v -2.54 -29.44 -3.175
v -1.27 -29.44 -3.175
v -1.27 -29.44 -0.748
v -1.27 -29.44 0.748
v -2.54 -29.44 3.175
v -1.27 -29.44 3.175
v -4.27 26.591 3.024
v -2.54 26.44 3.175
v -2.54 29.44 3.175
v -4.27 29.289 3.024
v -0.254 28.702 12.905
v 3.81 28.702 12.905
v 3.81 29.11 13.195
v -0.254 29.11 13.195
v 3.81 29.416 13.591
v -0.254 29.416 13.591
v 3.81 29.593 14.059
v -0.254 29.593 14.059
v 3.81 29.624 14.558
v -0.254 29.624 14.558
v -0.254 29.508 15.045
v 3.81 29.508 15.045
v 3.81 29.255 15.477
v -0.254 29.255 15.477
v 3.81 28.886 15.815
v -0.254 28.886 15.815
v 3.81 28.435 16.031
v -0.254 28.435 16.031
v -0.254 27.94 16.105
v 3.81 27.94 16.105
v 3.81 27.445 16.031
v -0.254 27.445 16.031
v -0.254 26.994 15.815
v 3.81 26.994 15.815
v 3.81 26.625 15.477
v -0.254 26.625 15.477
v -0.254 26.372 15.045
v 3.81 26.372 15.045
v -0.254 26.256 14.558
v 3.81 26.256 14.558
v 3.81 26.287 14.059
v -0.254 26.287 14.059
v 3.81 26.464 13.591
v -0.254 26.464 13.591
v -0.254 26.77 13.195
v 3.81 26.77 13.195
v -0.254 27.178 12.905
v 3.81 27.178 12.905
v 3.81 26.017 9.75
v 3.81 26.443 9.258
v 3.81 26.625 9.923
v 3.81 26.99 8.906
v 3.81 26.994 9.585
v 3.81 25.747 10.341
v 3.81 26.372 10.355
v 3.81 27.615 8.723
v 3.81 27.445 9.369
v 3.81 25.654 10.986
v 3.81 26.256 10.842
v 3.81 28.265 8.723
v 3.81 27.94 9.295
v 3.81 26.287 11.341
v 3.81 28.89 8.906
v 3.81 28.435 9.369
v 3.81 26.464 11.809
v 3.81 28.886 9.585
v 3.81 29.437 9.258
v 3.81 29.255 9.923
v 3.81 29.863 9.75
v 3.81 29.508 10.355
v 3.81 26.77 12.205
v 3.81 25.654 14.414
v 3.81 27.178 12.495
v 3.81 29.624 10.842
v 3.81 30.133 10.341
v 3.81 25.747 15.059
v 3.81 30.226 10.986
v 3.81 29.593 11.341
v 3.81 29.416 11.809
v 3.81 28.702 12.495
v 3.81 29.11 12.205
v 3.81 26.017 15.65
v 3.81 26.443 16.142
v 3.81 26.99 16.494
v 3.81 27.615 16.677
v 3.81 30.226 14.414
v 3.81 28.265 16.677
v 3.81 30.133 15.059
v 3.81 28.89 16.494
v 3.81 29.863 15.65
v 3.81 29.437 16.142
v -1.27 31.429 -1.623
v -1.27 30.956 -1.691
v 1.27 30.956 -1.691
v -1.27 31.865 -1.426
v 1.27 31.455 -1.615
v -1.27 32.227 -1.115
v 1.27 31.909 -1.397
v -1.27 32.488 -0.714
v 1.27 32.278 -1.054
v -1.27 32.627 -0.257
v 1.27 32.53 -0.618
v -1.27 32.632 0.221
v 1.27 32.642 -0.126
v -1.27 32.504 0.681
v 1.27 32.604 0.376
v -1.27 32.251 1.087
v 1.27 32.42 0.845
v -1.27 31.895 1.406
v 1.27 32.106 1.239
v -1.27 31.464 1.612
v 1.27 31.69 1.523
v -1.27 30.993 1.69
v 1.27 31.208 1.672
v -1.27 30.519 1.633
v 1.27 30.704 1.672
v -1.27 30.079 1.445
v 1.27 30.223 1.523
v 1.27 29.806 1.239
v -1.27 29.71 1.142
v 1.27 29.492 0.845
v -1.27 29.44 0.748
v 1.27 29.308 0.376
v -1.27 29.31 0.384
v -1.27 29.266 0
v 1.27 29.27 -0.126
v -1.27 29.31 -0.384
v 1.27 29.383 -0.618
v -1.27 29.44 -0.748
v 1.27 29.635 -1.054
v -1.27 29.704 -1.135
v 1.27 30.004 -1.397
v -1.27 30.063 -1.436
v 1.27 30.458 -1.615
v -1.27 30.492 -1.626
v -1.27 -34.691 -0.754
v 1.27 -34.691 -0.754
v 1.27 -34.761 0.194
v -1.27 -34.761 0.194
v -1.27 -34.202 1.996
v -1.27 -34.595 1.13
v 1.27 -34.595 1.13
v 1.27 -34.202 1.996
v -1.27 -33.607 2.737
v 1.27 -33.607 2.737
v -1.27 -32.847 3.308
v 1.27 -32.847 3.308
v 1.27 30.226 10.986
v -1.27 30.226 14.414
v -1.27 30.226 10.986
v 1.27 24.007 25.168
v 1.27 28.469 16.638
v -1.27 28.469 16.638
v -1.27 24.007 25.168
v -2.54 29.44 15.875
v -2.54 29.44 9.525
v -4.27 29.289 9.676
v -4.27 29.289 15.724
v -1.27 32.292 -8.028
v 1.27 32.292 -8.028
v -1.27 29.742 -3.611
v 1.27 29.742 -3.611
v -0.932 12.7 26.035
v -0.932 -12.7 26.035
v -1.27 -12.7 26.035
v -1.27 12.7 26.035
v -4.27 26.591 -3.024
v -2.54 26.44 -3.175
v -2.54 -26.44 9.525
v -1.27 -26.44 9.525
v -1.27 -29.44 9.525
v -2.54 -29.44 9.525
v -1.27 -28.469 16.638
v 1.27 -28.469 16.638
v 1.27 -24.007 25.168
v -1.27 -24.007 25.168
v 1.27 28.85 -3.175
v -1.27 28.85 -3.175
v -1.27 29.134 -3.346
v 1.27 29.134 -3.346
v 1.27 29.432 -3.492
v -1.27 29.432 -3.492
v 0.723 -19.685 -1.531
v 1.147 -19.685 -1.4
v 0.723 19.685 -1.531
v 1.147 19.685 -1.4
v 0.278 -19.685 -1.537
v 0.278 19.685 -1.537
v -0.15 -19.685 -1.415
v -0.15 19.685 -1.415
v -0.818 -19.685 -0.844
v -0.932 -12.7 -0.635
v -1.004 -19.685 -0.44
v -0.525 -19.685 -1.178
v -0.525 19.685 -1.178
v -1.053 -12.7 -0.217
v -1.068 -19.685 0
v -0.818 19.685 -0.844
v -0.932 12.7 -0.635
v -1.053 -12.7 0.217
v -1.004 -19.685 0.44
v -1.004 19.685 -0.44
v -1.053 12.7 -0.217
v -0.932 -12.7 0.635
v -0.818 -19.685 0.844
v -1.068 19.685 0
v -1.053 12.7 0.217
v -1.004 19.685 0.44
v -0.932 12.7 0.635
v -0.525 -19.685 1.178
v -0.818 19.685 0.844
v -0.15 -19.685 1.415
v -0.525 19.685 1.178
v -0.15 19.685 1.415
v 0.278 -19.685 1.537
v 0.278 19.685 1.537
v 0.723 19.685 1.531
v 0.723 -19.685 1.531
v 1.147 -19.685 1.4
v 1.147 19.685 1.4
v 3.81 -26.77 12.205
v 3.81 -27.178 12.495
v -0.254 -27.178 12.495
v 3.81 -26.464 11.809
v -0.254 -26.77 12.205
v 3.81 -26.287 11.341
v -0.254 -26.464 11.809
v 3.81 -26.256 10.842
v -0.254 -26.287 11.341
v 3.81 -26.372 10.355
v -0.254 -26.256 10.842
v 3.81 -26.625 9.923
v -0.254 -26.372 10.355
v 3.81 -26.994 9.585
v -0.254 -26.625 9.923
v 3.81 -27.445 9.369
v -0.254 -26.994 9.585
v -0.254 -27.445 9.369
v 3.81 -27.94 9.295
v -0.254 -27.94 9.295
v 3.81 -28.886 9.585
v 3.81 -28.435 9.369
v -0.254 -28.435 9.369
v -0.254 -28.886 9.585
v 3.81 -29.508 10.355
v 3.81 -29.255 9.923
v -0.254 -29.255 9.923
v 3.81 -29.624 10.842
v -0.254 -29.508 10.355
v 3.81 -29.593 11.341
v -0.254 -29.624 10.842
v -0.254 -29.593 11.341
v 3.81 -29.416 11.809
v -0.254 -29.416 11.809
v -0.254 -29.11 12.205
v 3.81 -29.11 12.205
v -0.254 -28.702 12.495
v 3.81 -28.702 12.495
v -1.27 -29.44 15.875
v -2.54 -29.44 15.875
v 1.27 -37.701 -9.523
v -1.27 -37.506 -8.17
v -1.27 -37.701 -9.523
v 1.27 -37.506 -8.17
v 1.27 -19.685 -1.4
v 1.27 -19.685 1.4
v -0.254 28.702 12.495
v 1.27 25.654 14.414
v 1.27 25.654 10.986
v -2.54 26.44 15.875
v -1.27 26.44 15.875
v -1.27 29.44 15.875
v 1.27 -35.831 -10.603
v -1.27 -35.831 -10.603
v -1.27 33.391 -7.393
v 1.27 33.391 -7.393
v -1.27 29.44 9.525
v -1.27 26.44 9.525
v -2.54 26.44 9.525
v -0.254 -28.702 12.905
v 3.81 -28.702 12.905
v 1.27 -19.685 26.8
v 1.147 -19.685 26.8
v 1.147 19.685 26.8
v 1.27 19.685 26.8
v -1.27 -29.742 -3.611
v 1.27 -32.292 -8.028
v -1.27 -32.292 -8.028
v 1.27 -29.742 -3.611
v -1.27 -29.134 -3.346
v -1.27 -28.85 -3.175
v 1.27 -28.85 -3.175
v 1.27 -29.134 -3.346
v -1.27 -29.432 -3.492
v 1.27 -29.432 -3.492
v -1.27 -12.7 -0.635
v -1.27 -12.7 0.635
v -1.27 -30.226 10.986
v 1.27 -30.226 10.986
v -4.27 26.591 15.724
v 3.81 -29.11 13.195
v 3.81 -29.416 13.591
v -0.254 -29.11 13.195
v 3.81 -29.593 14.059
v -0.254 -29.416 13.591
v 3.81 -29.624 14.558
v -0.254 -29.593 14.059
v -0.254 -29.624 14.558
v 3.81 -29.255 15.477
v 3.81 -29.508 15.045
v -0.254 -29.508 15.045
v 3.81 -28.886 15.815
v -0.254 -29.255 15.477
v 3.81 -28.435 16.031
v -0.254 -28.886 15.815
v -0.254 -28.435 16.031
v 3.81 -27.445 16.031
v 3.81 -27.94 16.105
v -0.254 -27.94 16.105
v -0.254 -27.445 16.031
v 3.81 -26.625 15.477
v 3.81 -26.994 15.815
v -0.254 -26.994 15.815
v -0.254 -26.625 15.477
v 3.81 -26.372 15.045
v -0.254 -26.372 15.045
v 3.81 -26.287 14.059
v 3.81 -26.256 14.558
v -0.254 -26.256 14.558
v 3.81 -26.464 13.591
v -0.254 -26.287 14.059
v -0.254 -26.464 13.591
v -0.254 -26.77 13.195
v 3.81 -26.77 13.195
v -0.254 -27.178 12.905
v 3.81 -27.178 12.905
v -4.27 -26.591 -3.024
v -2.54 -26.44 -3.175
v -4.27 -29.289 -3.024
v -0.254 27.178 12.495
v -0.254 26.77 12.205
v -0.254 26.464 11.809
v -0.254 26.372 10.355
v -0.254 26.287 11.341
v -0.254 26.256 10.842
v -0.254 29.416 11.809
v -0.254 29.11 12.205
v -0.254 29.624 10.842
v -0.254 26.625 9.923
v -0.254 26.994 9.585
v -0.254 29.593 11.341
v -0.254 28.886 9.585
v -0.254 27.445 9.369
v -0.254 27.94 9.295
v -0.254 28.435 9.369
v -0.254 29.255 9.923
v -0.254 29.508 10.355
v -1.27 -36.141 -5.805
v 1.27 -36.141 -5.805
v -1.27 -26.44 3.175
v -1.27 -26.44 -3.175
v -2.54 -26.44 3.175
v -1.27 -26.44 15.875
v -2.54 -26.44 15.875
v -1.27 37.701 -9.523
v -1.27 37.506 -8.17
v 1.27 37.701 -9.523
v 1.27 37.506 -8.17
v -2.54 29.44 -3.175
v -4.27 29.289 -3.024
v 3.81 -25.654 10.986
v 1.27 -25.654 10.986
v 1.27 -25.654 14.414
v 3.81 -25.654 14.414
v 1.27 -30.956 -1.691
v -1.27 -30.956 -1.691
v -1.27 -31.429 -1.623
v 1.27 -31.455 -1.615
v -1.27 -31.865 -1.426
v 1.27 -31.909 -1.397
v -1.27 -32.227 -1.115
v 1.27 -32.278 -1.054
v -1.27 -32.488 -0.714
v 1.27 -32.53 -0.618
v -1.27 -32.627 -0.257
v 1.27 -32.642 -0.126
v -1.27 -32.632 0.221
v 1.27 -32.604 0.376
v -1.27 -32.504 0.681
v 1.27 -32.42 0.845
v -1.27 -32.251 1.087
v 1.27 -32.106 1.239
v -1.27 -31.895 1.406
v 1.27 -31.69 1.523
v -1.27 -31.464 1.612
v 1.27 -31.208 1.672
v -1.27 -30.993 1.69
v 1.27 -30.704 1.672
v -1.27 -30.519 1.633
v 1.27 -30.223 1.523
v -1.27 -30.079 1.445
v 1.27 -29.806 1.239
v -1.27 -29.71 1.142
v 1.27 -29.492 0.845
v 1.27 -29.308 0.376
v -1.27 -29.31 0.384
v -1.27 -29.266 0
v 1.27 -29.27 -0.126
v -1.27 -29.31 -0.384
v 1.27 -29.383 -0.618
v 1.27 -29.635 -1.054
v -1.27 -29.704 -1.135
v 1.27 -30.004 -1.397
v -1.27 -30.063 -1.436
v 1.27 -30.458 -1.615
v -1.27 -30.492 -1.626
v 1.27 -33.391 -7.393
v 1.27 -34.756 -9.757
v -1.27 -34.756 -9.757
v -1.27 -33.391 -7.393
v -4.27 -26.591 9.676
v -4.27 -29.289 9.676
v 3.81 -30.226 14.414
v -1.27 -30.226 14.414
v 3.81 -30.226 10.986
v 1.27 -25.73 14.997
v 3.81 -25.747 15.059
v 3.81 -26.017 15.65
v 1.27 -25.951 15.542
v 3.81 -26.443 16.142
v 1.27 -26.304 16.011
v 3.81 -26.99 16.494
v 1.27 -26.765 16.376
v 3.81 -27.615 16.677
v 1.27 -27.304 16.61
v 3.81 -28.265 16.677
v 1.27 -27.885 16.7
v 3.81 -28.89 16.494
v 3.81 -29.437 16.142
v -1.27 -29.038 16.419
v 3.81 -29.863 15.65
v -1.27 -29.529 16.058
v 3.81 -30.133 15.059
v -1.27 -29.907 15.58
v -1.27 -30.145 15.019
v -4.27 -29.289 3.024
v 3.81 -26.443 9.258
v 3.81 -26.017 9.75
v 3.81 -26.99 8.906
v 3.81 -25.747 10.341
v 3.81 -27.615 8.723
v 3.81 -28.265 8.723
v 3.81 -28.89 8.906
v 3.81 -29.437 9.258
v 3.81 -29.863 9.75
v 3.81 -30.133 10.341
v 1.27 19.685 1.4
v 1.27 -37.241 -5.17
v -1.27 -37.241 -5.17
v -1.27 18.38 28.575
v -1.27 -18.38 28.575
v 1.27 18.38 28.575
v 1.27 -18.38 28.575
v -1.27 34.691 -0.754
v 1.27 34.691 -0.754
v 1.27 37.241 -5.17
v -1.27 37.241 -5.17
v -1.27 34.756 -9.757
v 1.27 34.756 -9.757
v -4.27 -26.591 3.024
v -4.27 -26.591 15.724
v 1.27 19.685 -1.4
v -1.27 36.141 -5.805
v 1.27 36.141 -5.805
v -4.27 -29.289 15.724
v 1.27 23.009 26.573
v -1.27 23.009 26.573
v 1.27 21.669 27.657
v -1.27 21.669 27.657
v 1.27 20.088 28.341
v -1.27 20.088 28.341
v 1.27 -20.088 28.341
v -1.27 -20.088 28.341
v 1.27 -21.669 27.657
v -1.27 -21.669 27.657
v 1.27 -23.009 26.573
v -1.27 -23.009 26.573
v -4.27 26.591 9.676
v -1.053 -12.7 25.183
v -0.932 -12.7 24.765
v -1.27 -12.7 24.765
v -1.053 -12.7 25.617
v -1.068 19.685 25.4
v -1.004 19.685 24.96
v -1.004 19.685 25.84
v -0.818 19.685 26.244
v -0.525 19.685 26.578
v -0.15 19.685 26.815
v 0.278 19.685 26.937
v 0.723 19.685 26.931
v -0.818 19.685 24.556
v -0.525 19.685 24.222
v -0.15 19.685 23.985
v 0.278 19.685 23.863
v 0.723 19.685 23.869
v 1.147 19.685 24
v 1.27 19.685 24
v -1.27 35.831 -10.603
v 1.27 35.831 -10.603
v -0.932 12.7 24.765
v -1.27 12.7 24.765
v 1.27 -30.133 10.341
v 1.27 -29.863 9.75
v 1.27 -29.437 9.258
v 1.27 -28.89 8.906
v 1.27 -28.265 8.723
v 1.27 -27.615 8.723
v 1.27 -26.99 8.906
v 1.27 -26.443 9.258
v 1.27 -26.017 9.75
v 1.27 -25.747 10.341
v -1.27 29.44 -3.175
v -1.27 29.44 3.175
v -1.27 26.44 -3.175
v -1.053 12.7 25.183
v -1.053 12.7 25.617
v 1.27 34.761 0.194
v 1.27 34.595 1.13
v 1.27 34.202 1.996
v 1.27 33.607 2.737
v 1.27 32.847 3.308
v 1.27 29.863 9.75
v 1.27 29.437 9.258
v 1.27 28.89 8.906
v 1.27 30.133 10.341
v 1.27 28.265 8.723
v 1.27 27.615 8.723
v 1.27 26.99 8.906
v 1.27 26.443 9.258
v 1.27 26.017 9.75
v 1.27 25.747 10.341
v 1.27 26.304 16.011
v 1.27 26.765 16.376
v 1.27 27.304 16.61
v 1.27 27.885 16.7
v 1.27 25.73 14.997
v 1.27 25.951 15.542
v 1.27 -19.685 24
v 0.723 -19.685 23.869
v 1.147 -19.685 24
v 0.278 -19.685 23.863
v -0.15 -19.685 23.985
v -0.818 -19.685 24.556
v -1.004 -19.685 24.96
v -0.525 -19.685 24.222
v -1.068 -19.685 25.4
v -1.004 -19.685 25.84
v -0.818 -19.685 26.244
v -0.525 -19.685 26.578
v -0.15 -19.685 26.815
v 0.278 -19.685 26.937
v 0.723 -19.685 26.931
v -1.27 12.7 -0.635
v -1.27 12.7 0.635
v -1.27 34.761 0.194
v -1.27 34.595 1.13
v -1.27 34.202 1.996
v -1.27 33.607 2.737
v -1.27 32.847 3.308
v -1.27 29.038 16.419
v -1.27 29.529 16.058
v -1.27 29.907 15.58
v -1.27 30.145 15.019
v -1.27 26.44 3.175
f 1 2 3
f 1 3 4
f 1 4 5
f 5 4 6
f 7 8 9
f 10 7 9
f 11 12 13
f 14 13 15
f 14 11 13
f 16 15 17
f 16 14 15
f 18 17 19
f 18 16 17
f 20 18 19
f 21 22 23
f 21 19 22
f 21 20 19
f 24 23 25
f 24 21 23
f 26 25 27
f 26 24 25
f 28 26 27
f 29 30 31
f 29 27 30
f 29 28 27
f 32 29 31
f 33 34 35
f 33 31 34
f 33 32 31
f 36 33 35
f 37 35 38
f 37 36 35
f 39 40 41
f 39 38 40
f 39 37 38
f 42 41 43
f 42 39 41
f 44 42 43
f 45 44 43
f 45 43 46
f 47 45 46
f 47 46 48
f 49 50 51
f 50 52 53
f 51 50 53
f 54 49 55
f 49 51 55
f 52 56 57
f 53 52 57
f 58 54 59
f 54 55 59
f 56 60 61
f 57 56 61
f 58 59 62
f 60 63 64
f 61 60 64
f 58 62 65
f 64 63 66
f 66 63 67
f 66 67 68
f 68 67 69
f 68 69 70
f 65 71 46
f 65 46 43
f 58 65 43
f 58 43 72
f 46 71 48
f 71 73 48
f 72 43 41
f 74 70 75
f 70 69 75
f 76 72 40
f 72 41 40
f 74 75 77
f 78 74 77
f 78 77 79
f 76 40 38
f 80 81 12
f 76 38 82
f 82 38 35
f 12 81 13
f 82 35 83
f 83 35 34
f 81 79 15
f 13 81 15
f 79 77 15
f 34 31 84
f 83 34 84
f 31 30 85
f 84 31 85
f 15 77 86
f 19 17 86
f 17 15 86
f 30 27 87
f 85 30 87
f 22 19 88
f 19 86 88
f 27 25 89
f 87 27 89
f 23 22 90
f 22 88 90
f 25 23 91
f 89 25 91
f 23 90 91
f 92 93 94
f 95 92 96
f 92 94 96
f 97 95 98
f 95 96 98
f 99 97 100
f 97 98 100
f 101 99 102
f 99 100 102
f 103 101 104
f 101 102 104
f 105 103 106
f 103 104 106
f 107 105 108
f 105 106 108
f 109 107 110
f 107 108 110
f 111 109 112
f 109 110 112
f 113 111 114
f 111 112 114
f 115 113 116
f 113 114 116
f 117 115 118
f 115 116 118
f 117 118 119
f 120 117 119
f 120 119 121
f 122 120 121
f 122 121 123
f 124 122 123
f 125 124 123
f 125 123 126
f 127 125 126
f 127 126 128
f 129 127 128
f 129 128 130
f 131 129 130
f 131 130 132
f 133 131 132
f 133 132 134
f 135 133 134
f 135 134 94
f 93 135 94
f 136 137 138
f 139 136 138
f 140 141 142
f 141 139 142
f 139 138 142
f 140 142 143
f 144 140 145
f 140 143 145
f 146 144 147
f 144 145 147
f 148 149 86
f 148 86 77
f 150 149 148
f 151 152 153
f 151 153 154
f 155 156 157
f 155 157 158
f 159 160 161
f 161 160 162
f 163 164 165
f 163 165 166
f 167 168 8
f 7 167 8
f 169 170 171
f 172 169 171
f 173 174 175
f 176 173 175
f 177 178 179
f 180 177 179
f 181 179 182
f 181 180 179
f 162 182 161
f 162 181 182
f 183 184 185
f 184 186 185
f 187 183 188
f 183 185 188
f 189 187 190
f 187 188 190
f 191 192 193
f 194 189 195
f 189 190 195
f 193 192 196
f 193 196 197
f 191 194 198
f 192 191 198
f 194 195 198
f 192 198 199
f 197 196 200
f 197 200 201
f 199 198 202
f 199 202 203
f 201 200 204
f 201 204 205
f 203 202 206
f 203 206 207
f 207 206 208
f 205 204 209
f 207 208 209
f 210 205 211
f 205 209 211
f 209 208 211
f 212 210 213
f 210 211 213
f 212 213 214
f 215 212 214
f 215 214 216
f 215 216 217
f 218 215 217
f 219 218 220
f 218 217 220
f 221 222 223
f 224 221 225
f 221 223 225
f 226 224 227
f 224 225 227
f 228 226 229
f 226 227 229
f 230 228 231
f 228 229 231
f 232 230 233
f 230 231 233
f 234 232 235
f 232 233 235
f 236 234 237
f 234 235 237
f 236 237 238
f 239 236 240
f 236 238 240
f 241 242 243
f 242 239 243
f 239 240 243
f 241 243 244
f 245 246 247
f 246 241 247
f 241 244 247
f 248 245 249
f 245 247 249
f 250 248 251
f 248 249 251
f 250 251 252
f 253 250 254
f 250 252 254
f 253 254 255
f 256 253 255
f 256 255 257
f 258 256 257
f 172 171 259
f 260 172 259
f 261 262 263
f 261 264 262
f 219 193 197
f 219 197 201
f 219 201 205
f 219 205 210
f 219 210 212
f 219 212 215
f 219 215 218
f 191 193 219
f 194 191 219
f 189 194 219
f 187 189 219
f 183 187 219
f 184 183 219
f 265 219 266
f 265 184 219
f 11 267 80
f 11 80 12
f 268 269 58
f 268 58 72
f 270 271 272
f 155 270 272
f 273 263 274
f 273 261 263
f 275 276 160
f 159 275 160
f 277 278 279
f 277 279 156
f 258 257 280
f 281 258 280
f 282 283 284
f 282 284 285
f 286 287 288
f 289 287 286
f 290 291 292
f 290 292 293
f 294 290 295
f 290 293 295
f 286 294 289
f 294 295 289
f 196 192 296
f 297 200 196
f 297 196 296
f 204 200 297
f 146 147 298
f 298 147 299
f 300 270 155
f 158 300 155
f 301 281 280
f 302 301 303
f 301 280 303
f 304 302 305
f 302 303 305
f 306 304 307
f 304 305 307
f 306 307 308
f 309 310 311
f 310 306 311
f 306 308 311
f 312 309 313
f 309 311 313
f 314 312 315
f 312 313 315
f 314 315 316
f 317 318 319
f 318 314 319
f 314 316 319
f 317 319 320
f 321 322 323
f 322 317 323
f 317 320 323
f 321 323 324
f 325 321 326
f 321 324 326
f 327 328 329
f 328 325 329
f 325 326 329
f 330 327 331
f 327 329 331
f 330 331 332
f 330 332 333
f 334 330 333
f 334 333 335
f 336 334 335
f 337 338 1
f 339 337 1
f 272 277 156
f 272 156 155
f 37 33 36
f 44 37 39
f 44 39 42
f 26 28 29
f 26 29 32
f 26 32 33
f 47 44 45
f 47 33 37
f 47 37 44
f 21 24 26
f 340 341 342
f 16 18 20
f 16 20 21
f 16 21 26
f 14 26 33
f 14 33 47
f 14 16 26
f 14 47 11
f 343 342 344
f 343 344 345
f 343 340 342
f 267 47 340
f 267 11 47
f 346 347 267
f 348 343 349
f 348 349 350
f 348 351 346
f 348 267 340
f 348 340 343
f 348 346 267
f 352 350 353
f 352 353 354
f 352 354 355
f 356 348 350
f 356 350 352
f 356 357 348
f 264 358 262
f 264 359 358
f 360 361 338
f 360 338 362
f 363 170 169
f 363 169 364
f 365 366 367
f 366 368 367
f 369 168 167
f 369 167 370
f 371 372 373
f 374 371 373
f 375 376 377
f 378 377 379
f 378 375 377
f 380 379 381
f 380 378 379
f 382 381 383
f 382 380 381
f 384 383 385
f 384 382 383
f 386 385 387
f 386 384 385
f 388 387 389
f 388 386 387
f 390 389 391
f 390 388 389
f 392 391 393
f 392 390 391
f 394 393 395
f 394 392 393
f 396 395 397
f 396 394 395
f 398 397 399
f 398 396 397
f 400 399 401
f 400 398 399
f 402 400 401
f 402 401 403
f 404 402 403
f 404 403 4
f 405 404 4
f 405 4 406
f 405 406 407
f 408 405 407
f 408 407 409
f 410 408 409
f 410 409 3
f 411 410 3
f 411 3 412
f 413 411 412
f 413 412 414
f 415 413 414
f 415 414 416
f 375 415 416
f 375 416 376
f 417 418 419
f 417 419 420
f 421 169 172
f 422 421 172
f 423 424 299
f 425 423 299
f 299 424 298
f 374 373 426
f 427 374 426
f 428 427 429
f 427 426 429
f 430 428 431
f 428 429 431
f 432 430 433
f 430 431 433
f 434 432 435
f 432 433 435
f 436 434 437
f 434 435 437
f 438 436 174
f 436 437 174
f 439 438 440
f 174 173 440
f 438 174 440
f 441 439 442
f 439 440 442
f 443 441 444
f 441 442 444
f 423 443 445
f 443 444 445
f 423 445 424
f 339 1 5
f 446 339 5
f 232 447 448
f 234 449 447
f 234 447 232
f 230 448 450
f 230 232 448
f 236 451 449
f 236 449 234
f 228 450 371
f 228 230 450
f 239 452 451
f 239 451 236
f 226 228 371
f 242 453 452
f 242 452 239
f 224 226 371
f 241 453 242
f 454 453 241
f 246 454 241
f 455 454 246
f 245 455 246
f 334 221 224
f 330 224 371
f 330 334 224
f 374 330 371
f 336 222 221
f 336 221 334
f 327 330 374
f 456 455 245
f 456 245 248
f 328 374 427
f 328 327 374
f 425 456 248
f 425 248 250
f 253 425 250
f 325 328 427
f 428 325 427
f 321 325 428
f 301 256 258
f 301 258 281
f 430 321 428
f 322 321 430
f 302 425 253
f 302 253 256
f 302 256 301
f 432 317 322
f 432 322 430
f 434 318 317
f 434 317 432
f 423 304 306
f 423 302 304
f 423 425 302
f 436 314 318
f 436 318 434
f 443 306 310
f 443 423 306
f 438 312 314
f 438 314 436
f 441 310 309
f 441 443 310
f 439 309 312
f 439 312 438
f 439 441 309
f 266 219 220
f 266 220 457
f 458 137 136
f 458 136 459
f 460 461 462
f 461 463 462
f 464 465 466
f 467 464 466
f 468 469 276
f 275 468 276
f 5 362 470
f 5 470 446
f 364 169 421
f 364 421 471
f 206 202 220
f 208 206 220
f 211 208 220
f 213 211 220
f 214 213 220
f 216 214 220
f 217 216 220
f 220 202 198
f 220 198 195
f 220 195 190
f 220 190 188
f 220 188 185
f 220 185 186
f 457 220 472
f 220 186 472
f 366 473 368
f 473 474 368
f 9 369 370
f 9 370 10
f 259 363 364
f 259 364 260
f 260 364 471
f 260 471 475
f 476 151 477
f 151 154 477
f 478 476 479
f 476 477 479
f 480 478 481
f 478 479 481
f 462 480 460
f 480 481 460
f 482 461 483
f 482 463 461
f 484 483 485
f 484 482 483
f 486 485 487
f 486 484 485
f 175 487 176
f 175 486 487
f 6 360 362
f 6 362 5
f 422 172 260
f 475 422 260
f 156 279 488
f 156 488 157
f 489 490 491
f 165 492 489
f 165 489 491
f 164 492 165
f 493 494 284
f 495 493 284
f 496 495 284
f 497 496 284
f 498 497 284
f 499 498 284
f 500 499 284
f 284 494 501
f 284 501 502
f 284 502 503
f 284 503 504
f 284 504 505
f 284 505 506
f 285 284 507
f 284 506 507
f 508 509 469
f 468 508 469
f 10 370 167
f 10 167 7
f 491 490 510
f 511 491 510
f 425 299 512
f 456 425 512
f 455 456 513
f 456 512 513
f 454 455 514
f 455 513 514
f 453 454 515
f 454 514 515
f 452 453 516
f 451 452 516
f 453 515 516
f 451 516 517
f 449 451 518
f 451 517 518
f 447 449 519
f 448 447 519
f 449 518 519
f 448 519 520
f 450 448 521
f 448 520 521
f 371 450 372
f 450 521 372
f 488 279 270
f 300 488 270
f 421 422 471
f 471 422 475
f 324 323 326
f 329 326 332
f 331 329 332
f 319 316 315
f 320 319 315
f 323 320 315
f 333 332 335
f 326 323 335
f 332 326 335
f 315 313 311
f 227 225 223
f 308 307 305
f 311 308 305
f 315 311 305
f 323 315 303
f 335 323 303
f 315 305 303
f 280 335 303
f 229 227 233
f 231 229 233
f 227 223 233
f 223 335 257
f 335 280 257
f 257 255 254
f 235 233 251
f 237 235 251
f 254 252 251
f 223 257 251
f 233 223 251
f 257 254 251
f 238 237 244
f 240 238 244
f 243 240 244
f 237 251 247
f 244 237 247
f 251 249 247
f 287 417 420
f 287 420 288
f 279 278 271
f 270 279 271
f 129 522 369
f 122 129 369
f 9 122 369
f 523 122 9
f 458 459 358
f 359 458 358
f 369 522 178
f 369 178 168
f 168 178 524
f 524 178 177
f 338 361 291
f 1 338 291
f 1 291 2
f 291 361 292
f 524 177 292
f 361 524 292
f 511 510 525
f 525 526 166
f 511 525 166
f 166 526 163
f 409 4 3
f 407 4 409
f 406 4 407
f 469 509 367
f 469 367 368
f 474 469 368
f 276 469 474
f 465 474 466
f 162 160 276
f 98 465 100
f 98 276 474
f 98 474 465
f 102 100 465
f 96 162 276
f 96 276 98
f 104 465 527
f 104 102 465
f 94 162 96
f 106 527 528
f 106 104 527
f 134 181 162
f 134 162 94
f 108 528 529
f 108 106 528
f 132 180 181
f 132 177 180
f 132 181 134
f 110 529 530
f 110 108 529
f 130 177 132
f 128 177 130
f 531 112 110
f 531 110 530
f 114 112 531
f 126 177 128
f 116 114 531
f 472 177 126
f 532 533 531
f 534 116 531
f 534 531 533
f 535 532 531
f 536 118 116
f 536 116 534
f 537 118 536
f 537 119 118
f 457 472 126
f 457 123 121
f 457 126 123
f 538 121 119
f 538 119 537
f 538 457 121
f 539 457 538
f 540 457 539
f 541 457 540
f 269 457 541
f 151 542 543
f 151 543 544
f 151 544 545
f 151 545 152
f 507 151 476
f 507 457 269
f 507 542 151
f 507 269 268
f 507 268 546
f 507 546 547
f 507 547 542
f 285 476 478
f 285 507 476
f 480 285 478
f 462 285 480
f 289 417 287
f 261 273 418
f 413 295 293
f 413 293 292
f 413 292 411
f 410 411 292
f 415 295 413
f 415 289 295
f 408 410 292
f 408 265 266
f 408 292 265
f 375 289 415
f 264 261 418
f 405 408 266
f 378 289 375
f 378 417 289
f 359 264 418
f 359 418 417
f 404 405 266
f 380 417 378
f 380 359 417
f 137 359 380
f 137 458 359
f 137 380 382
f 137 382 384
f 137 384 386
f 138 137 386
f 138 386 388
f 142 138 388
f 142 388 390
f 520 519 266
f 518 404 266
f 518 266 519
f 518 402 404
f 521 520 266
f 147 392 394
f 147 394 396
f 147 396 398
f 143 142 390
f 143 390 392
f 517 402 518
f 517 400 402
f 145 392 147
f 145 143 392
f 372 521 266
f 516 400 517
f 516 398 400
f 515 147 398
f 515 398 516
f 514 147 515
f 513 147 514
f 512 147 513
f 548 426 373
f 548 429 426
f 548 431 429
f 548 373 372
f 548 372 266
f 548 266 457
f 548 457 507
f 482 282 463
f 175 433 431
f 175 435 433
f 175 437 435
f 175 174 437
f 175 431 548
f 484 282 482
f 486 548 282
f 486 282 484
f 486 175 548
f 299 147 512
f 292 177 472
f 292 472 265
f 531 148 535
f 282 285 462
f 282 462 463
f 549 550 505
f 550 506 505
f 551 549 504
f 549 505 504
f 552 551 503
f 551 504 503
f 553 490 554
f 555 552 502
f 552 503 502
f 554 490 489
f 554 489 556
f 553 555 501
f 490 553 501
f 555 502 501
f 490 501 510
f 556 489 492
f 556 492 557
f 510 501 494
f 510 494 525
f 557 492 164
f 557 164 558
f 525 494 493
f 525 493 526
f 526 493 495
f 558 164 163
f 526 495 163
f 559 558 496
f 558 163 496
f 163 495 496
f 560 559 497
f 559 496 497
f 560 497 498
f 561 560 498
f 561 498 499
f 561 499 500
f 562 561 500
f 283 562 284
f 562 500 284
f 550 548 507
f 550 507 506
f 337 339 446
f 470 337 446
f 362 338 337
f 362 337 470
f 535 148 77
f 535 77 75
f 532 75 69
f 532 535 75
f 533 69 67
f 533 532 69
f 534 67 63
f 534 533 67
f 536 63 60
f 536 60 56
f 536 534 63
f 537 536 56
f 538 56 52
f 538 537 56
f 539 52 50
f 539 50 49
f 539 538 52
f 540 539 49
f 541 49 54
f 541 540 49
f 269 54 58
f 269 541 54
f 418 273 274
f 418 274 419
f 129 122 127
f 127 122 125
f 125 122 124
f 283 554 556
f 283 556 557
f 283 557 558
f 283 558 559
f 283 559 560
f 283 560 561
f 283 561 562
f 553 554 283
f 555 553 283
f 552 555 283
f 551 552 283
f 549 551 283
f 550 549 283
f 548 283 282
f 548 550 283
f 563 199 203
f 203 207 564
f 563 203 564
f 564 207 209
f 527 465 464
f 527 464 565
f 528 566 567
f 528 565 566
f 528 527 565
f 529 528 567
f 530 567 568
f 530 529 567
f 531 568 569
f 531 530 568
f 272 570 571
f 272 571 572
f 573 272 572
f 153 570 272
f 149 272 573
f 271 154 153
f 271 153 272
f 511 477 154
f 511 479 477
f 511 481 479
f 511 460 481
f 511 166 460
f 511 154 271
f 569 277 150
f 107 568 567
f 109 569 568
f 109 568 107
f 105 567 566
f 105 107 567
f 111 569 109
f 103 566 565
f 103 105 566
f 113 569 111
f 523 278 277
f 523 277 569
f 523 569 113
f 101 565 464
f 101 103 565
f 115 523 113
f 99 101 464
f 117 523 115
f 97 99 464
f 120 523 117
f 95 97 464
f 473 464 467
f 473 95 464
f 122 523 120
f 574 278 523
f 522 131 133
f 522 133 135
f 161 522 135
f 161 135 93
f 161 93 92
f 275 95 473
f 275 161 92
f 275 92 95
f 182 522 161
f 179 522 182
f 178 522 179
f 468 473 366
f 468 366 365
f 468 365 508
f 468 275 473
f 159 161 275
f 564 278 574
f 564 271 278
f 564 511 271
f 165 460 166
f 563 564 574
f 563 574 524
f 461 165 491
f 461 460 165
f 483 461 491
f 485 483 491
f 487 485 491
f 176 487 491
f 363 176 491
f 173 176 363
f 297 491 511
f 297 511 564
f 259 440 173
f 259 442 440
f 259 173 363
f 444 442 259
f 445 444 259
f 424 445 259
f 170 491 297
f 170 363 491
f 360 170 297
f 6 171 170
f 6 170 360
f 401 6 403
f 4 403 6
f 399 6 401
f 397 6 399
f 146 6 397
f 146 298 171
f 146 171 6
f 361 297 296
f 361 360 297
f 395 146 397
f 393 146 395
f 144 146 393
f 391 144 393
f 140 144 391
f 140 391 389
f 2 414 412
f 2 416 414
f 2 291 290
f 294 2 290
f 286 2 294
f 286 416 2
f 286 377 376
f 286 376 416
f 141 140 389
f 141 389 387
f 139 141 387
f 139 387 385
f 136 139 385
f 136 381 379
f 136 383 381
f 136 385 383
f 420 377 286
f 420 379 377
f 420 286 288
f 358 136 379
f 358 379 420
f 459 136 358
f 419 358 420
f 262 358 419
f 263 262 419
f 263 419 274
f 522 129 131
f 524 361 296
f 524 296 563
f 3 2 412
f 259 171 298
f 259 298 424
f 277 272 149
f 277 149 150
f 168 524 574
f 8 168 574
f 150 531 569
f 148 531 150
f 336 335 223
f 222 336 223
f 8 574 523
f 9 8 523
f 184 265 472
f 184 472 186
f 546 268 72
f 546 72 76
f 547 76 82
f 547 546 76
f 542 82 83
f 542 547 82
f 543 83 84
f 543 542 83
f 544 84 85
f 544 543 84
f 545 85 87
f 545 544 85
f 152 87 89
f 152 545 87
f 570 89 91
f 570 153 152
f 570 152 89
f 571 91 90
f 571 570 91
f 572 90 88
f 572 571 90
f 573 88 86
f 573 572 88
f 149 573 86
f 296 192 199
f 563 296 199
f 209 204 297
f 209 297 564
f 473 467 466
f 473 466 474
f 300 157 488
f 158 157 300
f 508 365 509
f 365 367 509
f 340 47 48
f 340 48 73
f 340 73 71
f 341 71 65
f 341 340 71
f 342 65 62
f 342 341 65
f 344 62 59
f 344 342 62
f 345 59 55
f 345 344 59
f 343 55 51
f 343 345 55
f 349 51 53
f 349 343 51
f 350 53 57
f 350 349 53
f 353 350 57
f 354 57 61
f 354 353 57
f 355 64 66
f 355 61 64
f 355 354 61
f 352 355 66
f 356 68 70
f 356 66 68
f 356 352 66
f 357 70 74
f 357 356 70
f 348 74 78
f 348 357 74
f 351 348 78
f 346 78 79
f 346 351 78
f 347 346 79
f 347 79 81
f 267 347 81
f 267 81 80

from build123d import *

# Parameters (mm, degrees)
SKETCH3_R                   = 3.81
DOWELSUPPORT_DEPTH          = 1.27
SKETCH5_W                   = 6.35
SKETCH5_H                   = 44.45
SLIDERDOWELSUPPORT_DEPTH    = 1.27
SKETCH17_R                  = 1.549999948
CUT_EXTRUDE1_DEPTH          = 19.685
CUT_EXTRUDE2_DEPTH          = 36.066505943
CUT_EXTRUDE2_DEPTH_BACK     = 36.066505943
SKETCH18_W                  = 1.27
SKETCH18_H                  = 25.4
LPATTERN1_COUNT             = 2
LPATTERN1_PITCH             = 25.4
LATERALSUPPORT_DEPTH        = 1.27
SKETCH8_W                   = 6.35
SKETCH8_H                   = 3
TABSUPPORT_DEPTH            = 1.27
STRINGDOWELSUPPORT_START    = -1.27
STRINGDOWELSUPPORT_DEPTH    = 5.08
INTERSUPPORT_DEPTH          = 1.27
SKETCH10_W                  = 6.35
SKETCH10_H                  = 3
TABBASE_DEPTH               = 1.27
SKETCH12_W                  = 6.35
SKETCH12_H                  = 3
TABDRAFT_DEPTH              = 1.73
TABDRAFT_DRAFT              = 5
TABDRAFT_PROFILE_2_DEPTH    = 1.73
TABDRAFT_PROFILE_2_DRAFT    = 5
STRINGDOWELHOLES_DEPTH      = 48.629791179
STRINGDOWELHOLES_DEPTH_BACK = 1.524
SKETCH14_R                  = 1.690500048
PULLEYDOWELHOLE_DEPTH       = 2.54
FILLET1_R                   = 6.35


with BuildPart() as part:
    # Sketch3 → DowelSupport (new, symmetric)
    with BuildSketch(Plane(origin=(0, 0, 0), x_dir=(0, 0, -1), z_dir=(1, 0, 0))):
        with Locations((0, 30.95625)):
            Circle(SKETCH3_R)
    extrude(amount=DOWELSUPPORT_DEPTH, both=True)

    # Sketch8 → TabSupport (add, symmetric)
    with BuildSketch(Plane(origin=(0, 0, 0), x_dir=(0, 0, -1), z_dir=(1, 0, 0))):
        with Locations((0, 27.94)):
            Rectangle(SKETCH8_W, SKETCH8_H)
        with Locations((-12.7, 27.94)):
            Rectangle(SKETCH8_W, SKETCH8_H)
    extrude(amount=TABSUPPORT_DEPTH, both=True)


with BuildPart() as body_2:
    # Sketch5 → SliderDowelSupport (new, symmetric)
    with BuildSketch(Plane(origin=(0, 0, 0), x_dir=(0, 0, -1), z_dir=(1, 0, 0))):
        Rectangle(SKETCH5_W, SKETCH5_H)
    extrude(amount=SLIDERDOWELSUPPORT_DEPTH, both=True)

    # Sketch17 → Cut-Extrude1 (cut, symmetric)
    with BuildSketch(Plane(origin=(0, 0, 0), x_dir=(1, 0, 0), z_dir=(0, 1, 0))):
        with Locations((0.482000052, 0)):
            Circle(SKETCH17_R)
        with BuildLine():
            Line((2.032, 0), (2.032, 1.399999994))
            Line((2.032, 1.399999994), (1.147206678, 1.399999994))
            ThreePointArc((1.147206678, 1.399999994), (1.792261491, 0.828078983), (2.032, 0))
        make_face()
        with BuildLine():
            Line((2.032, -1.399999994), (2.032, 0))
            ThreePointArc((2.032, 0), (1.792261491, -0.828078983), (1.147206678, -1.399999994))
            Line((1.147206678, -1.399999994), (2.032, -1.399999994))
        make_face()
    extrude(amount=CUT_EXTRUDE1_DEPTH, both=True, mode=Mode.SUBTRACT)

    # Sketch18 → Cut-Extrude2 (cut, two sides: drawn at the far end of the back side and taken through both)
    with BuildSketch(Plane.ZY.offset(1.27).offset(-CUT_EXTRUDE2_DEPTH_BACK)):
        Rectangle(SKETCH18_W, SKETCH18_H)
    extrude(amount=CUT_EXTRUDE2_DEPTH + CUT_EXTRUDE2_DEPTH_BACK, mode=Mode.SUBTRACT)


with BuildPart() as lpattern1_1:
    # LPattern1: pattern copy
    add(body_2.part.moved(Location(Vector(0, 0, 1) * (1 * LPATTERN1_PITCH))))


with BuildPart() as body_4:
    # Sketch6 → LateralSupport (new, symmetric)
    with BuildSketch(Plane(origin=(0, 0, 0), x_dir=(0, 0, -1), z_dir=(1, 0, 0))):
        Polygon((7.392863577, 33.391434671), (5.805363577, 36.141065329), (8.169612929, 37.506065329), (9.523465192, 37.701124423), (10.602965192, 35.831375577), (9.757112929, 34.756434671), align=None)
    extrude(amount=LATERALSUPPORT_DEPTH, both=True)


with BuildPart() as tabsupport_piece_1:
    # of the separate pieces the step leaves, piece 1, a body of its own (tabsupport_pieces)
    add(part.part.solids().sort_by_distance((1.27, 28.850193258, 3.175))[0])


with BuildPart() as tabsupport_piece_2:
    # of the separate pieces the step leaves, piece 2, a body of its own (tabsupport_pieces)
    add(part.part.solids().sort_by_distance((-1.27, 26.44, 9.525))[0])

    # Sketch15 → StringDowelSupport (add)
    with BuildSketch(Plane(origin=(0, 0, 0), x_dir=(0, 0, -1), z_dir=(1, 0, 0)).offset(STRINGDOWELSUPPORT_START)):
        with BuildLine():
            Line((-14.4145, 30.226), (-10.9855, 30.226))
            ThreePointArc((-10.9855, 30.226), (-8.6995, 27.94), (-10.9855, 25.654))
            Line((-10.9855, 25.654), (-14.4145, 25.654))
            ThreePointArc((-14.4145, 25.654), (-16.7005, 27.94), (-14.4145, 30.226))
        make_face()
    extrude(amount=STRINGDOWELSUPPORT_DEPTH)


with BuildPart() as body_2_1:
    add(body_2.part)

    add(lpattern1_1.part)  # InterSupport merges LPattern1_1

    add(body_4.part)  # InterSupport merges body 4

    add(tabsupport_piece_1.part)  # InterSupport merges TabSupport piece 1

    add(tabsupport_piece_2.part)  # InterSupport merges TabSupport piece 2
    # Sketch7 → InterSupport (add, symmetric)
    with BuildSketch(Plane(origin=(0, 0, 0), x_dir=(0, 0, -1), z_dir=(1, 0, 0))):
        Polygon((5.170363577, 37.240917591), (8.027863577, 32.291582409), (1.42875, 28.481582409), (-1.42875, 33.430917591), align=None)
        Polygon((-3.175, 15.875), (-3.175, 22.225), (3.175, 22.225), (3.175, 26.44), (0.923046602, 28.251940251), (-0.923046602, 33.660559749), (-10.9855, 30.226), (-14.4145, 30.226), (-15.109807039, 29.269115541), (-28.575, 22.225), (-22.225, 22.225), (-22.225, 0), (-3.175, 0), align=None)
    extrude(amount=INTERSUPPORT_DEPTH, both=True)

    # Sketch10 → TabBase (add)
    with BuildSketch(Plane.ZY.offset(1.27)):
        with Locations((0, 27.94)):
            Rectangle(SKETCH10_W, SKETCH10_H)
        with Locations((12.7, 27.94)):
            Rectangle(SKETCH10_W, SKETCH10_H)
    extrude(amount=TABBASE_DEPTH)


with BuildPart() as tabdraft_tool:
    # Sketch12 → TabDraft (with draft: the straight prism first)
    with BuildSketch(Plane.ZY.offset(2.54)):
        with Locations((0, 27.94)):
            Rectangle(SKETCH12_W, SKETCH12_H)
    extrude(amount=TABDRAFT_DEPTH)
    # TabDraft: the draft: its side faces are tilted about the plane it starts from
    tabdraft_sides = [tabdraft_tool.faces().sort_by_distance(p)[0] for p in [
        (-3.405, 27.94, 3.175),
        (-3.405, 29.44, 0),
        (-3.405, 27.94, -3.175),
        (-3.405, 26.44, 0),
    ]]
    draft(tabdraft_sides, Plane.ZY.offset(2.54), TABDRAFT_DRAFT)


with BuildPart() as body_2_2:
    add(body_2_1.part)

    # TabDraft: add tabdraft_tool
    add(tabdraft_tool.part)


with BuildPart() as tabdraft_profile_2_tool:
    # Sketch12 → TabDraft profile 2 (with draft: the straight prism first)
    with BuildSketch(Plane.ZY.offset(2.54)):
        with Locations((12.7, 27.94)):
            Rectangle(SKETCH12_W, SKETCH12_H)
    extrude(amount=TABDRAFT_PROFILE_2_DEPTH)
    # TabDraft profile 2: the draft: its side faces are tilted about the plane it starts from
    tabdraft_profile_2_sides = [tabdraft_profile_2_tool.faces().sort_by_distance(p)[0] for p in [
        (-3.405, 27.94, 9.525),
        (-3.405, 26.44, 12.7),
        (-3.405, 27.94, 15.875),
        (-3.405, 29.44, 12.7),
    ]]
    draft(tabdraft_profile_2_sides, Plane.ZY.offset(2.54), TABDRAFT_PROFILE_2_DRAFT)


with BuildPart() as body_2_3:
    add(body_2_2.part)

    # TabDraft profile 2: add tabdraft_profile_2_tool
    add(tabdraft_profile_2_tool.part)

    # Sketch16 → StringDowelHoles (cut, two sides: drawn at the far end of the back side and taken through both)
    with BuildSketch(Plane(origin=(1.27, 0, 0), x_dir=(0, 0, -1), z_dir=(1, 0, 0)).offset(-STRINGDOWELHOLES_DEPTH_BACK)):
        with BuildLine():
            Line((-12.905478326, 27.178), (-12.494521674, 27.178))
            ThreePointArc((-12.494521674, 27.178), (-9.294999952, 27.94), (-12.494521674, 28.702))
            Line((-12.494521674, 28.702), (-12.905478326, 28.702))
            ThreePointArc((-12.905478326, 28.702), (-16.105000048, 27.94), (-12.905478326, 27.178))
        make_face()
    extrude(amount=STRINGDOWELHOLES_DEPTH + STRINGDOWELHOLES_DEPTH_BACK, mode=Mode.SUBTRACT)

    # Sketch14 → PulleyDowelHole (cut)
    with BuildSketch(Plane(origin=(1.27, 0, 0), x_dir=(0, 0, -1), z_dir=(1, 0, 0))):
        with Locations((0, 30.95625)):
            Circle(SKETCH14_R)
    extrude(amount=-PULLEYDOWELHOLE_DEPTH, mode=Mode.SUBTRACT)

    # Mirror1: body 2 across plane


with BuildPart() as body_2_4:
    add(body_2_3.part)
    add(body_2_3.part.mirror(Plane.ZX))

    # Fillet1
    fillet1_edges = [body_2_4.edges().sort_by_distance(p)[0] for p in [
        (0, -22.225, 28.575),
        (0, 22.225, 28.575),
    ]]
    fillet(fillet1_edges, radius=FILLET1_R)


solid = body_2_4.part
